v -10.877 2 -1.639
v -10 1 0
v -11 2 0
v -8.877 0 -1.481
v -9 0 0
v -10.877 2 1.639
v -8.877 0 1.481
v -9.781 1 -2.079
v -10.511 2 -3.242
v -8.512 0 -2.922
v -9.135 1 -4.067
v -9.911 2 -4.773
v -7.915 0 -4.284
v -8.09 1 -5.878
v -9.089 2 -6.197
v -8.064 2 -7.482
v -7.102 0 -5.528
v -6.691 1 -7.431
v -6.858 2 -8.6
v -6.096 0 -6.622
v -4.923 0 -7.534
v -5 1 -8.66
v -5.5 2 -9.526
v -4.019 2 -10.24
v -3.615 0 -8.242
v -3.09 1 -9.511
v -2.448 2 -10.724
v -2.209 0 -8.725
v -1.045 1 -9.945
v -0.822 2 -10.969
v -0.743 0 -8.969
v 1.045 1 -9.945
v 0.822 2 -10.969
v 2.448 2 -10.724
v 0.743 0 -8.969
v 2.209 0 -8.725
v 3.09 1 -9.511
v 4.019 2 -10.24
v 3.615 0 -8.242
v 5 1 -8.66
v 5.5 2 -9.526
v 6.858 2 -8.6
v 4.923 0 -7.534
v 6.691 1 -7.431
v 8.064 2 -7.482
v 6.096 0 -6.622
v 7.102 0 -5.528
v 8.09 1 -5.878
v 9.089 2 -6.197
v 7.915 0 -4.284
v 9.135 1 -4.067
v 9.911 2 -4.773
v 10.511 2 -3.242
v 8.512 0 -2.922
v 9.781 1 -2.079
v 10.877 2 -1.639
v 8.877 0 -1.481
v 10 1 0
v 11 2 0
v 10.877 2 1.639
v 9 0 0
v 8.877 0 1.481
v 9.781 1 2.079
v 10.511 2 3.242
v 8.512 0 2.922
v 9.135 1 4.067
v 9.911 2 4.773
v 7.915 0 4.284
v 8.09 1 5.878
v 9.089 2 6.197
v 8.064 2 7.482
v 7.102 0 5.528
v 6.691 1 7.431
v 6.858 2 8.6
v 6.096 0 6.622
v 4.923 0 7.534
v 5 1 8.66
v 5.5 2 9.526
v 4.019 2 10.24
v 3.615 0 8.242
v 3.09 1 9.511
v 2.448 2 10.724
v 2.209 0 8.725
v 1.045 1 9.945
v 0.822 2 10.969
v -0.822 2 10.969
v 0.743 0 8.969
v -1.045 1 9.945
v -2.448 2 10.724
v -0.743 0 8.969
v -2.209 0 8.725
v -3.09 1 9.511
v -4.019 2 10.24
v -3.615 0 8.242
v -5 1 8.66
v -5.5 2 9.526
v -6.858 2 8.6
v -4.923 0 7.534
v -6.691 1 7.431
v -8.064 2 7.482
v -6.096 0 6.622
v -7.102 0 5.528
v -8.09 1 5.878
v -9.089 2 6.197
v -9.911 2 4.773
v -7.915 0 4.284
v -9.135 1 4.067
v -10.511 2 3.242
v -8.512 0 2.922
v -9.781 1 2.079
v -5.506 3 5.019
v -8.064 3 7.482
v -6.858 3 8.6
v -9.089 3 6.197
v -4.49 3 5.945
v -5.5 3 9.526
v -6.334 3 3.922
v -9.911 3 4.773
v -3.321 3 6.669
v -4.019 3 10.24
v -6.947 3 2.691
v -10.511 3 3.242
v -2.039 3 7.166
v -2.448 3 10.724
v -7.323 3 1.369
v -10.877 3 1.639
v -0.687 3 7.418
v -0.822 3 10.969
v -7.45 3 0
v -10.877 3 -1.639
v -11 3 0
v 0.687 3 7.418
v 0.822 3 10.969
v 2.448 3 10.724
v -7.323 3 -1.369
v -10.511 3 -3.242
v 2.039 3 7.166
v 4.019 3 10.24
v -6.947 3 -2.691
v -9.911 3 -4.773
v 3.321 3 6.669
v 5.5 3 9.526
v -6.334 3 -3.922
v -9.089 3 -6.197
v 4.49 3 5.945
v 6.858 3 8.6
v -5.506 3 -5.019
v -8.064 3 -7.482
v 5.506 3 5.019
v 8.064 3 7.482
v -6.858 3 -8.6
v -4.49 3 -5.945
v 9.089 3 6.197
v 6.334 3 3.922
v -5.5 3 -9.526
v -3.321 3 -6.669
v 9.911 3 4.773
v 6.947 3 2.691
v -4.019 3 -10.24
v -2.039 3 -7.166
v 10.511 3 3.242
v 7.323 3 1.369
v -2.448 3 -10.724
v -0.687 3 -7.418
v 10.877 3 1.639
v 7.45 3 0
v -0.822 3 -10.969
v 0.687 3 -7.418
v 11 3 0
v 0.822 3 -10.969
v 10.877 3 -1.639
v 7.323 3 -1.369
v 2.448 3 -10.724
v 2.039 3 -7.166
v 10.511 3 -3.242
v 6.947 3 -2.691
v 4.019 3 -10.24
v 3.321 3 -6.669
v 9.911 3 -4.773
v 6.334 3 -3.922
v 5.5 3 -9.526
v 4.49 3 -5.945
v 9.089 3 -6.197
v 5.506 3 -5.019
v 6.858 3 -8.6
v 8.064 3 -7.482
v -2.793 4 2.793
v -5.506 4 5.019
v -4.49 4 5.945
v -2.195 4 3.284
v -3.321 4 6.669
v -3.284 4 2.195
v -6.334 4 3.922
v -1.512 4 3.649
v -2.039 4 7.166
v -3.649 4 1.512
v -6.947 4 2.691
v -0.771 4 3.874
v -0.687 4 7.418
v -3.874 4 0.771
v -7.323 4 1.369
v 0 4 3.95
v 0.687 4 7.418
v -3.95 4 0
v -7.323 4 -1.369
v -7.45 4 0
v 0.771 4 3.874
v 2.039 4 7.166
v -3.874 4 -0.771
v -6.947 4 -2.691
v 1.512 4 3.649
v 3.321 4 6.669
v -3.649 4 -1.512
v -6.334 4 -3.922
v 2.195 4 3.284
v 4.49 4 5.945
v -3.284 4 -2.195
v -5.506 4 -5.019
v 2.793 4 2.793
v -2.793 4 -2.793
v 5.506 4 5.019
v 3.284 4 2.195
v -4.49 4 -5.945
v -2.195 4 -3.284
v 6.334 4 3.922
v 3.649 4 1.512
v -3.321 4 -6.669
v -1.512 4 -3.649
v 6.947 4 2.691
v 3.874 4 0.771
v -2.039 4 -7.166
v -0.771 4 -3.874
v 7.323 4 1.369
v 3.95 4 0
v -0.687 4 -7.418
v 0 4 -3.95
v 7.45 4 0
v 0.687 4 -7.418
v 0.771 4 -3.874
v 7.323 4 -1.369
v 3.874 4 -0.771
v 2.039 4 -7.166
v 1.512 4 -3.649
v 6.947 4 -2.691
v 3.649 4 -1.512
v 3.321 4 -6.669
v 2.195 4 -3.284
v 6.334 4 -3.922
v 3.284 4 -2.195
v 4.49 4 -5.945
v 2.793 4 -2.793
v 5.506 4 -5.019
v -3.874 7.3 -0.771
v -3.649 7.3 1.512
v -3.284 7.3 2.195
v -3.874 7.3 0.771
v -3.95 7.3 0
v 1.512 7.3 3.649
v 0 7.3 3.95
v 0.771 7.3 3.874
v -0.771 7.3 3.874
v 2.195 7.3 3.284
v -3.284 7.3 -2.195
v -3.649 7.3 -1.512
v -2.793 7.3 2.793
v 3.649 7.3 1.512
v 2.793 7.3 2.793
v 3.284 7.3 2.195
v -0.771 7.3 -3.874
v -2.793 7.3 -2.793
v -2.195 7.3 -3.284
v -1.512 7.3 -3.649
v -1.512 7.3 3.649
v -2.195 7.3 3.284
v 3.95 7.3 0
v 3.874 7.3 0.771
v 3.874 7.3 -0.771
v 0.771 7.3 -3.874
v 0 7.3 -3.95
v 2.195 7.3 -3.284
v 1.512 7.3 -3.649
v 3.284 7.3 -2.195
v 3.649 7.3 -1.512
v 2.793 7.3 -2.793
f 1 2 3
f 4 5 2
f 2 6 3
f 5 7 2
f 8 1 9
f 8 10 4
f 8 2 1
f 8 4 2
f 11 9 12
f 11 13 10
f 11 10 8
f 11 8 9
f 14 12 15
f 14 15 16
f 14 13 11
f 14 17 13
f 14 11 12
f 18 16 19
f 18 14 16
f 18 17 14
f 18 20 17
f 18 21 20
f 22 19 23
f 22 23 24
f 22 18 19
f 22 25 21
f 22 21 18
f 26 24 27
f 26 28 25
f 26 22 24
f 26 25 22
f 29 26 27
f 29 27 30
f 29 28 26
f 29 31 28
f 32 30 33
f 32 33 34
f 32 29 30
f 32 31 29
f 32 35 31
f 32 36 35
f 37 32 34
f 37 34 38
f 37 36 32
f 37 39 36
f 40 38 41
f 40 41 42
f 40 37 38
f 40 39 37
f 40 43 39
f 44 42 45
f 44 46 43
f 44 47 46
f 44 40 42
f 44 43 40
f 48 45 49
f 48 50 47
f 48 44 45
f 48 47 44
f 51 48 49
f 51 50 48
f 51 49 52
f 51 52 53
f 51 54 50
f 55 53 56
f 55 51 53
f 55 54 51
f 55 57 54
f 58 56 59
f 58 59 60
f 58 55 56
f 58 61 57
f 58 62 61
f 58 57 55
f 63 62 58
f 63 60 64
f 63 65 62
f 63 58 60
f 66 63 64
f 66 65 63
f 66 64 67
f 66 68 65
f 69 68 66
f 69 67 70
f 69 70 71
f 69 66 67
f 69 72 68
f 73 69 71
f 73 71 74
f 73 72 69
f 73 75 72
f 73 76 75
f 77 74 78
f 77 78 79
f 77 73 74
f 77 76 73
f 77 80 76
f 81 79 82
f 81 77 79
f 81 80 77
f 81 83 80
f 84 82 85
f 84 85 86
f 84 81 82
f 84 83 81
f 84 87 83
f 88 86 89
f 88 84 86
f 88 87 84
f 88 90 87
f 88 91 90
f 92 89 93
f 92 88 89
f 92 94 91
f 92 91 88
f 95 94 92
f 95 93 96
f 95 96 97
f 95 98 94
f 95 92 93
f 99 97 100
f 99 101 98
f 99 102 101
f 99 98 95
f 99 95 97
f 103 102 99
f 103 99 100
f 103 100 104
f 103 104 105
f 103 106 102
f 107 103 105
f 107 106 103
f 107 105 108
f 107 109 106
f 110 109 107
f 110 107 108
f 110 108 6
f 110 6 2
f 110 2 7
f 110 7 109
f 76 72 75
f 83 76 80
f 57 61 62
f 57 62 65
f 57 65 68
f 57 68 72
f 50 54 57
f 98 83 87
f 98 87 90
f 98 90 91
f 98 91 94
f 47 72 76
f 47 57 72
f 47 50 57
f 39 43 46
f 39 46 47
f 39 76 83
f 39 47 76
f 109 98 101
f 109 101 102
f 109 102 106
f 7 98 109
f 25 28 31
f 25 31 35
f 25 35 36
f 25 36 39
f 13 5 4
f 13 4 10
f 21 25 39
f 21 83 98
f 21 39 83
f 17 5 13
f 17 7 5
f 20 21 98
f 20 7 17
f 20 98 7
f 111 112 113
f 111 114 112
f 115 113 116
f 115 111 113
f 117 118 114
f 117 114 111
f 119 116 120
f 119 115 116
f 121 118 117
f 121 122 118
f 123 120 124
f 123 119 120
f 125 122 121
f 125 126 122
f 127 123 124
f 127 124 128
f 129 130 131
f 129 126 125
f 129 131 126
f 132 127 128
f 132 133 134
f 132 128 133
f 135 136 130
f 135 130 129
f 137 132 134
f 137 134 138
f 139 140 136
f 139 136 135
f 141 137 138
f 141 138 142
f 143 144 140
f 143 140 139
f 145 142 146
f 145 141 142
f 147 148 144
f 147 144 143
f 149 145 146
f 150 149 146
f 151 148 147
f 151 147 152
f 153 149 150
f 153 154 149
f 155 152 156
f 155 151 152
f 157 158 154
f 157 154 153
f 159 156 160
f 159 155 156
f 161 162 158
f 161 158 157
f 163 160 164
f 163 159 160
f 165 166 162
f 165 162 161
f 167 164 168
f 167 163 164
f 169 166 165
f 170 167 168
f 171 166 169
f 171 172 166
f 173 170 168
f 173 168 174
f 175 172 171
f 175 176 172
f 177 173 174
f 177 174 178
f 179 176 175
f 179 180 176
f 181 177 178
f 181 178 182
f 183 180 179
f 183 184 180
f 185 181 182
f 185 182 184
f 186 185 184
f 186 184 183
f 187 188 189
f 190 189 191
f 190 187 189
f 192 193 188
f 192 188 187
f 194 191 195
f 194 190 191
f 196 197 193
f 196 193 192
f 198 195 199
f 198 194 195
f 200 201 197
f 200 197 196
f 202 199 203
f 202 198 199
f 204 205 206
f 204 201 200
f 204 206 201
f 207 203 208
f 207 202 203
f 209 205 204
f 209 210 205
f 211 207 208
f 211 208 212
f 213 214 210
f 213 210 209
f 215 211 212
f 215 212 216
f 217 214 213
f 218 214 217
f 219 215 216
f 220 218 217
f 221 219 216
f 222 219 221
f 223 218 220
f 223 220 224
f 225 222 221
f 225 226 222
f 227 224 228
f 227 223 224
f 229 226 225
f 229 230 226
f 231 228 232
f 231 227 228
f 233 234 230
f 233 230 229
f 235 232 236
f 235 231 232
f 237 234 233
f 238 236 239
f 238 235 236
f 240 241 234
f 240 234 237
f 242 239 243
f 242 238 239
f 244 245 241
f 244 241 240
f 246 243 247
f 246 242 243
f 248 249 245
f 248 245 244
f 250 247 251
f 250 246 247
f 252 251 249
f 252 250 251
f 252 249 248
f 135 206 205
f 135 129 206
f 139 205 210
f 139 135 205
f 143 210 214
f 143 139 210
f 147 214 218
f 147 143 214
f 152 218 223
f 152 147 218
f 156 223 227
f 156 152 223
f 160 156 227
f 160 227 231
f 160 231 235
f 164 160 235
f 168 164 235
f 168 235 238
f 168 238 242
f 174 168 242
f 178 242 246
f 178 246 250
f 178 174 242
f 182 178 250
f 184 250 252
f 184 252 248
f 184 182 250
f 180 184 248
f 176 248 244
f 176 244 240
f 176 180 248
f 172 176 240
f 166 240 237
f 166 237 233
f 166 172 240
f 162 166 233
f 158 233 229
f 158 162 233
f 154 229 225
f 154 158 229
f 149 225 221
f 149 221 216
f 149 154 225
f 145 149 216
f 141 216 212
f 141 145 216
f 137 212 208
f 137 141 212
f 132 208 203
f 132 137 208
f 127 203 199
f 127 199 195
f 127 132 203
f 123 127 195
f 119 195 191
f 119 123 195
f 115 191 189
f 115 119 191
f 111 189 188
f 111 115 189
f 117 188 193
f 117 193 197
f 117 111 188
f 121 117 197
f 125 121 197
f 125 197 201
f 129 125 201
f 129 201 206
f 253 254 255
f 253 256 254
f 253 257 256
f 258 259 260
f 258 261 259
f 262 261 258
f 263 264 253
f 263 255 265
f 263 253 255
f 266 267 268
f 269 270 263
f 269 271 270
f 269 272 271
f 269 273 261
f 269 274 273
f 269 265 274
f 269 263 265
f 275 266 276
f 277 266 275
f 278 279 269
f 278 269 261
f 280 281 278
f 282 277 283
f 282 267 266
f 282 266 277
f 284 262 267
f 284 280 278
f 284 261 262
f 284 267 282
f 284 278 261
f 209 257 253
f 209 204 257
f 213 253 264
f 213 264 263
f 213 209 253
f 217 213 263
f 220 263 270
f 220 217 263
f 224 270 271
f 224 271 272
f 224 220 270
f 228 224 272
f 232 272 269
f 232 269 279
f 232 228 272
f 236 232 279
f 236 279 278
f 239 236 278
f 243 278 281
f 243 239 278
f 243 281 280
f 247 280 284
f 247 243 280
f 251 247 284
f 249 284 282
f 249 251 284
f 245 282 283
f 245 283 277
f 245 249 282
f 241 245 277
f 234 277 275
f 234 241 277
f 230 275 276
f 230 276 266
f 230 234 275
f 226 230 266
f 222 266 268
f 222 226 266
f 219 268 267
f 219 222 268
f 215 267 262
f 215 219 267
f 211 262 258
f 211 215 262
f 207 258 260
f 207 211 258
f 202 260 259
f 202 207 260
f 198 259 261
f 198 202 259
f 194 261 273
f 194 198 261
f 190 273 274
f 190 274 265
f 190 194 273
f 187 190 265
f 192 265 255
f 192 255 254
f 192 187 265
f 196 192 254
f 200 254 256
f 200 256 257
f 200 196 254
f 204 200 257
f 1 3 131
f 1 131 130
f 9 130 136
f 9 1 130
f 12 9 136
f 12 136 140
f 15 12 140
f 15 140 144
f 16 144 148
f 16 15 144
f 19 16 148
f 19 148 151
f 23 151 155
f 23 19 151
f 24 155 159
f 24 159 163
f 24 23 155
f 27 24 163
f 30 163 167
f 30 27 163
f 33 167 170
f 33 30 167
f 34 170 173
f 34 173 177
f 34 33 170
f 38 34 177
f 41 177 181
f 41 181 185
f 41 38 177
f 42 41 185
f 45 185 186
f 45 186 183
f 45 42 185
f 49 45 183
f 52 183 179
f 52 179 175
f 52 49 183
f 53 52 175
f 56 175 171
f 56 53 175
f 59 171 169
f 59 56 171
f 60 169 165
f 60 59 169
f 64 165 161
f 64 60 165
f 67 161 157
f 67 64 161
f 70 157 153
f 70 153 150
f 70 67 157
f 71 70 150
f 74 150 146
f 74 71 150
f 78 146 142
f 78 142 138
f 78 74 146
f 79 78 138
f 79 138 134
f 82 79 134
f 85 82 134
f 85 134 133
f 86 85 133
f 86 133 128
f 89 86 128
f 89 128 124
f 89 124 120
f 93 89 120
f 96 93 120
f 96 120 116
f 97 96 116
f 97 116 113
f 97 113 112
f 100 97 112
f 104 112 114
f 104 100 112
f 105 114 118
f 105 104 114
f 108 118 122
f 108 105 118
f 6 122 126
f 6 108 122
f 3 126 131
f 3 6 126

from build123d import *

# Parameters (mm, degrees)
F2_SIZE = 2


with BuildPart() as f1:
    # F0 (on Top) → F1 (revolve)
    with BuildSketch(Plane.XY):
        Polygon((-11, 3), (-11, 0), (0, 0), (0, 7.3), (-3.95, 7.3), (-3.95, 4), (-7.45, 4), (-7.45, 3), align=None)
    revolve(axis=Axis((0, 3.65, 0), (0, -1, 0)))

    # F2
    f2_edges = [f1.edges().sort_by_distance(p)[0] for p in [
        (11, 0, 0),
    ]]
    chamfer(f2_edges, length=F2_SIZE)


solid = f1.part
